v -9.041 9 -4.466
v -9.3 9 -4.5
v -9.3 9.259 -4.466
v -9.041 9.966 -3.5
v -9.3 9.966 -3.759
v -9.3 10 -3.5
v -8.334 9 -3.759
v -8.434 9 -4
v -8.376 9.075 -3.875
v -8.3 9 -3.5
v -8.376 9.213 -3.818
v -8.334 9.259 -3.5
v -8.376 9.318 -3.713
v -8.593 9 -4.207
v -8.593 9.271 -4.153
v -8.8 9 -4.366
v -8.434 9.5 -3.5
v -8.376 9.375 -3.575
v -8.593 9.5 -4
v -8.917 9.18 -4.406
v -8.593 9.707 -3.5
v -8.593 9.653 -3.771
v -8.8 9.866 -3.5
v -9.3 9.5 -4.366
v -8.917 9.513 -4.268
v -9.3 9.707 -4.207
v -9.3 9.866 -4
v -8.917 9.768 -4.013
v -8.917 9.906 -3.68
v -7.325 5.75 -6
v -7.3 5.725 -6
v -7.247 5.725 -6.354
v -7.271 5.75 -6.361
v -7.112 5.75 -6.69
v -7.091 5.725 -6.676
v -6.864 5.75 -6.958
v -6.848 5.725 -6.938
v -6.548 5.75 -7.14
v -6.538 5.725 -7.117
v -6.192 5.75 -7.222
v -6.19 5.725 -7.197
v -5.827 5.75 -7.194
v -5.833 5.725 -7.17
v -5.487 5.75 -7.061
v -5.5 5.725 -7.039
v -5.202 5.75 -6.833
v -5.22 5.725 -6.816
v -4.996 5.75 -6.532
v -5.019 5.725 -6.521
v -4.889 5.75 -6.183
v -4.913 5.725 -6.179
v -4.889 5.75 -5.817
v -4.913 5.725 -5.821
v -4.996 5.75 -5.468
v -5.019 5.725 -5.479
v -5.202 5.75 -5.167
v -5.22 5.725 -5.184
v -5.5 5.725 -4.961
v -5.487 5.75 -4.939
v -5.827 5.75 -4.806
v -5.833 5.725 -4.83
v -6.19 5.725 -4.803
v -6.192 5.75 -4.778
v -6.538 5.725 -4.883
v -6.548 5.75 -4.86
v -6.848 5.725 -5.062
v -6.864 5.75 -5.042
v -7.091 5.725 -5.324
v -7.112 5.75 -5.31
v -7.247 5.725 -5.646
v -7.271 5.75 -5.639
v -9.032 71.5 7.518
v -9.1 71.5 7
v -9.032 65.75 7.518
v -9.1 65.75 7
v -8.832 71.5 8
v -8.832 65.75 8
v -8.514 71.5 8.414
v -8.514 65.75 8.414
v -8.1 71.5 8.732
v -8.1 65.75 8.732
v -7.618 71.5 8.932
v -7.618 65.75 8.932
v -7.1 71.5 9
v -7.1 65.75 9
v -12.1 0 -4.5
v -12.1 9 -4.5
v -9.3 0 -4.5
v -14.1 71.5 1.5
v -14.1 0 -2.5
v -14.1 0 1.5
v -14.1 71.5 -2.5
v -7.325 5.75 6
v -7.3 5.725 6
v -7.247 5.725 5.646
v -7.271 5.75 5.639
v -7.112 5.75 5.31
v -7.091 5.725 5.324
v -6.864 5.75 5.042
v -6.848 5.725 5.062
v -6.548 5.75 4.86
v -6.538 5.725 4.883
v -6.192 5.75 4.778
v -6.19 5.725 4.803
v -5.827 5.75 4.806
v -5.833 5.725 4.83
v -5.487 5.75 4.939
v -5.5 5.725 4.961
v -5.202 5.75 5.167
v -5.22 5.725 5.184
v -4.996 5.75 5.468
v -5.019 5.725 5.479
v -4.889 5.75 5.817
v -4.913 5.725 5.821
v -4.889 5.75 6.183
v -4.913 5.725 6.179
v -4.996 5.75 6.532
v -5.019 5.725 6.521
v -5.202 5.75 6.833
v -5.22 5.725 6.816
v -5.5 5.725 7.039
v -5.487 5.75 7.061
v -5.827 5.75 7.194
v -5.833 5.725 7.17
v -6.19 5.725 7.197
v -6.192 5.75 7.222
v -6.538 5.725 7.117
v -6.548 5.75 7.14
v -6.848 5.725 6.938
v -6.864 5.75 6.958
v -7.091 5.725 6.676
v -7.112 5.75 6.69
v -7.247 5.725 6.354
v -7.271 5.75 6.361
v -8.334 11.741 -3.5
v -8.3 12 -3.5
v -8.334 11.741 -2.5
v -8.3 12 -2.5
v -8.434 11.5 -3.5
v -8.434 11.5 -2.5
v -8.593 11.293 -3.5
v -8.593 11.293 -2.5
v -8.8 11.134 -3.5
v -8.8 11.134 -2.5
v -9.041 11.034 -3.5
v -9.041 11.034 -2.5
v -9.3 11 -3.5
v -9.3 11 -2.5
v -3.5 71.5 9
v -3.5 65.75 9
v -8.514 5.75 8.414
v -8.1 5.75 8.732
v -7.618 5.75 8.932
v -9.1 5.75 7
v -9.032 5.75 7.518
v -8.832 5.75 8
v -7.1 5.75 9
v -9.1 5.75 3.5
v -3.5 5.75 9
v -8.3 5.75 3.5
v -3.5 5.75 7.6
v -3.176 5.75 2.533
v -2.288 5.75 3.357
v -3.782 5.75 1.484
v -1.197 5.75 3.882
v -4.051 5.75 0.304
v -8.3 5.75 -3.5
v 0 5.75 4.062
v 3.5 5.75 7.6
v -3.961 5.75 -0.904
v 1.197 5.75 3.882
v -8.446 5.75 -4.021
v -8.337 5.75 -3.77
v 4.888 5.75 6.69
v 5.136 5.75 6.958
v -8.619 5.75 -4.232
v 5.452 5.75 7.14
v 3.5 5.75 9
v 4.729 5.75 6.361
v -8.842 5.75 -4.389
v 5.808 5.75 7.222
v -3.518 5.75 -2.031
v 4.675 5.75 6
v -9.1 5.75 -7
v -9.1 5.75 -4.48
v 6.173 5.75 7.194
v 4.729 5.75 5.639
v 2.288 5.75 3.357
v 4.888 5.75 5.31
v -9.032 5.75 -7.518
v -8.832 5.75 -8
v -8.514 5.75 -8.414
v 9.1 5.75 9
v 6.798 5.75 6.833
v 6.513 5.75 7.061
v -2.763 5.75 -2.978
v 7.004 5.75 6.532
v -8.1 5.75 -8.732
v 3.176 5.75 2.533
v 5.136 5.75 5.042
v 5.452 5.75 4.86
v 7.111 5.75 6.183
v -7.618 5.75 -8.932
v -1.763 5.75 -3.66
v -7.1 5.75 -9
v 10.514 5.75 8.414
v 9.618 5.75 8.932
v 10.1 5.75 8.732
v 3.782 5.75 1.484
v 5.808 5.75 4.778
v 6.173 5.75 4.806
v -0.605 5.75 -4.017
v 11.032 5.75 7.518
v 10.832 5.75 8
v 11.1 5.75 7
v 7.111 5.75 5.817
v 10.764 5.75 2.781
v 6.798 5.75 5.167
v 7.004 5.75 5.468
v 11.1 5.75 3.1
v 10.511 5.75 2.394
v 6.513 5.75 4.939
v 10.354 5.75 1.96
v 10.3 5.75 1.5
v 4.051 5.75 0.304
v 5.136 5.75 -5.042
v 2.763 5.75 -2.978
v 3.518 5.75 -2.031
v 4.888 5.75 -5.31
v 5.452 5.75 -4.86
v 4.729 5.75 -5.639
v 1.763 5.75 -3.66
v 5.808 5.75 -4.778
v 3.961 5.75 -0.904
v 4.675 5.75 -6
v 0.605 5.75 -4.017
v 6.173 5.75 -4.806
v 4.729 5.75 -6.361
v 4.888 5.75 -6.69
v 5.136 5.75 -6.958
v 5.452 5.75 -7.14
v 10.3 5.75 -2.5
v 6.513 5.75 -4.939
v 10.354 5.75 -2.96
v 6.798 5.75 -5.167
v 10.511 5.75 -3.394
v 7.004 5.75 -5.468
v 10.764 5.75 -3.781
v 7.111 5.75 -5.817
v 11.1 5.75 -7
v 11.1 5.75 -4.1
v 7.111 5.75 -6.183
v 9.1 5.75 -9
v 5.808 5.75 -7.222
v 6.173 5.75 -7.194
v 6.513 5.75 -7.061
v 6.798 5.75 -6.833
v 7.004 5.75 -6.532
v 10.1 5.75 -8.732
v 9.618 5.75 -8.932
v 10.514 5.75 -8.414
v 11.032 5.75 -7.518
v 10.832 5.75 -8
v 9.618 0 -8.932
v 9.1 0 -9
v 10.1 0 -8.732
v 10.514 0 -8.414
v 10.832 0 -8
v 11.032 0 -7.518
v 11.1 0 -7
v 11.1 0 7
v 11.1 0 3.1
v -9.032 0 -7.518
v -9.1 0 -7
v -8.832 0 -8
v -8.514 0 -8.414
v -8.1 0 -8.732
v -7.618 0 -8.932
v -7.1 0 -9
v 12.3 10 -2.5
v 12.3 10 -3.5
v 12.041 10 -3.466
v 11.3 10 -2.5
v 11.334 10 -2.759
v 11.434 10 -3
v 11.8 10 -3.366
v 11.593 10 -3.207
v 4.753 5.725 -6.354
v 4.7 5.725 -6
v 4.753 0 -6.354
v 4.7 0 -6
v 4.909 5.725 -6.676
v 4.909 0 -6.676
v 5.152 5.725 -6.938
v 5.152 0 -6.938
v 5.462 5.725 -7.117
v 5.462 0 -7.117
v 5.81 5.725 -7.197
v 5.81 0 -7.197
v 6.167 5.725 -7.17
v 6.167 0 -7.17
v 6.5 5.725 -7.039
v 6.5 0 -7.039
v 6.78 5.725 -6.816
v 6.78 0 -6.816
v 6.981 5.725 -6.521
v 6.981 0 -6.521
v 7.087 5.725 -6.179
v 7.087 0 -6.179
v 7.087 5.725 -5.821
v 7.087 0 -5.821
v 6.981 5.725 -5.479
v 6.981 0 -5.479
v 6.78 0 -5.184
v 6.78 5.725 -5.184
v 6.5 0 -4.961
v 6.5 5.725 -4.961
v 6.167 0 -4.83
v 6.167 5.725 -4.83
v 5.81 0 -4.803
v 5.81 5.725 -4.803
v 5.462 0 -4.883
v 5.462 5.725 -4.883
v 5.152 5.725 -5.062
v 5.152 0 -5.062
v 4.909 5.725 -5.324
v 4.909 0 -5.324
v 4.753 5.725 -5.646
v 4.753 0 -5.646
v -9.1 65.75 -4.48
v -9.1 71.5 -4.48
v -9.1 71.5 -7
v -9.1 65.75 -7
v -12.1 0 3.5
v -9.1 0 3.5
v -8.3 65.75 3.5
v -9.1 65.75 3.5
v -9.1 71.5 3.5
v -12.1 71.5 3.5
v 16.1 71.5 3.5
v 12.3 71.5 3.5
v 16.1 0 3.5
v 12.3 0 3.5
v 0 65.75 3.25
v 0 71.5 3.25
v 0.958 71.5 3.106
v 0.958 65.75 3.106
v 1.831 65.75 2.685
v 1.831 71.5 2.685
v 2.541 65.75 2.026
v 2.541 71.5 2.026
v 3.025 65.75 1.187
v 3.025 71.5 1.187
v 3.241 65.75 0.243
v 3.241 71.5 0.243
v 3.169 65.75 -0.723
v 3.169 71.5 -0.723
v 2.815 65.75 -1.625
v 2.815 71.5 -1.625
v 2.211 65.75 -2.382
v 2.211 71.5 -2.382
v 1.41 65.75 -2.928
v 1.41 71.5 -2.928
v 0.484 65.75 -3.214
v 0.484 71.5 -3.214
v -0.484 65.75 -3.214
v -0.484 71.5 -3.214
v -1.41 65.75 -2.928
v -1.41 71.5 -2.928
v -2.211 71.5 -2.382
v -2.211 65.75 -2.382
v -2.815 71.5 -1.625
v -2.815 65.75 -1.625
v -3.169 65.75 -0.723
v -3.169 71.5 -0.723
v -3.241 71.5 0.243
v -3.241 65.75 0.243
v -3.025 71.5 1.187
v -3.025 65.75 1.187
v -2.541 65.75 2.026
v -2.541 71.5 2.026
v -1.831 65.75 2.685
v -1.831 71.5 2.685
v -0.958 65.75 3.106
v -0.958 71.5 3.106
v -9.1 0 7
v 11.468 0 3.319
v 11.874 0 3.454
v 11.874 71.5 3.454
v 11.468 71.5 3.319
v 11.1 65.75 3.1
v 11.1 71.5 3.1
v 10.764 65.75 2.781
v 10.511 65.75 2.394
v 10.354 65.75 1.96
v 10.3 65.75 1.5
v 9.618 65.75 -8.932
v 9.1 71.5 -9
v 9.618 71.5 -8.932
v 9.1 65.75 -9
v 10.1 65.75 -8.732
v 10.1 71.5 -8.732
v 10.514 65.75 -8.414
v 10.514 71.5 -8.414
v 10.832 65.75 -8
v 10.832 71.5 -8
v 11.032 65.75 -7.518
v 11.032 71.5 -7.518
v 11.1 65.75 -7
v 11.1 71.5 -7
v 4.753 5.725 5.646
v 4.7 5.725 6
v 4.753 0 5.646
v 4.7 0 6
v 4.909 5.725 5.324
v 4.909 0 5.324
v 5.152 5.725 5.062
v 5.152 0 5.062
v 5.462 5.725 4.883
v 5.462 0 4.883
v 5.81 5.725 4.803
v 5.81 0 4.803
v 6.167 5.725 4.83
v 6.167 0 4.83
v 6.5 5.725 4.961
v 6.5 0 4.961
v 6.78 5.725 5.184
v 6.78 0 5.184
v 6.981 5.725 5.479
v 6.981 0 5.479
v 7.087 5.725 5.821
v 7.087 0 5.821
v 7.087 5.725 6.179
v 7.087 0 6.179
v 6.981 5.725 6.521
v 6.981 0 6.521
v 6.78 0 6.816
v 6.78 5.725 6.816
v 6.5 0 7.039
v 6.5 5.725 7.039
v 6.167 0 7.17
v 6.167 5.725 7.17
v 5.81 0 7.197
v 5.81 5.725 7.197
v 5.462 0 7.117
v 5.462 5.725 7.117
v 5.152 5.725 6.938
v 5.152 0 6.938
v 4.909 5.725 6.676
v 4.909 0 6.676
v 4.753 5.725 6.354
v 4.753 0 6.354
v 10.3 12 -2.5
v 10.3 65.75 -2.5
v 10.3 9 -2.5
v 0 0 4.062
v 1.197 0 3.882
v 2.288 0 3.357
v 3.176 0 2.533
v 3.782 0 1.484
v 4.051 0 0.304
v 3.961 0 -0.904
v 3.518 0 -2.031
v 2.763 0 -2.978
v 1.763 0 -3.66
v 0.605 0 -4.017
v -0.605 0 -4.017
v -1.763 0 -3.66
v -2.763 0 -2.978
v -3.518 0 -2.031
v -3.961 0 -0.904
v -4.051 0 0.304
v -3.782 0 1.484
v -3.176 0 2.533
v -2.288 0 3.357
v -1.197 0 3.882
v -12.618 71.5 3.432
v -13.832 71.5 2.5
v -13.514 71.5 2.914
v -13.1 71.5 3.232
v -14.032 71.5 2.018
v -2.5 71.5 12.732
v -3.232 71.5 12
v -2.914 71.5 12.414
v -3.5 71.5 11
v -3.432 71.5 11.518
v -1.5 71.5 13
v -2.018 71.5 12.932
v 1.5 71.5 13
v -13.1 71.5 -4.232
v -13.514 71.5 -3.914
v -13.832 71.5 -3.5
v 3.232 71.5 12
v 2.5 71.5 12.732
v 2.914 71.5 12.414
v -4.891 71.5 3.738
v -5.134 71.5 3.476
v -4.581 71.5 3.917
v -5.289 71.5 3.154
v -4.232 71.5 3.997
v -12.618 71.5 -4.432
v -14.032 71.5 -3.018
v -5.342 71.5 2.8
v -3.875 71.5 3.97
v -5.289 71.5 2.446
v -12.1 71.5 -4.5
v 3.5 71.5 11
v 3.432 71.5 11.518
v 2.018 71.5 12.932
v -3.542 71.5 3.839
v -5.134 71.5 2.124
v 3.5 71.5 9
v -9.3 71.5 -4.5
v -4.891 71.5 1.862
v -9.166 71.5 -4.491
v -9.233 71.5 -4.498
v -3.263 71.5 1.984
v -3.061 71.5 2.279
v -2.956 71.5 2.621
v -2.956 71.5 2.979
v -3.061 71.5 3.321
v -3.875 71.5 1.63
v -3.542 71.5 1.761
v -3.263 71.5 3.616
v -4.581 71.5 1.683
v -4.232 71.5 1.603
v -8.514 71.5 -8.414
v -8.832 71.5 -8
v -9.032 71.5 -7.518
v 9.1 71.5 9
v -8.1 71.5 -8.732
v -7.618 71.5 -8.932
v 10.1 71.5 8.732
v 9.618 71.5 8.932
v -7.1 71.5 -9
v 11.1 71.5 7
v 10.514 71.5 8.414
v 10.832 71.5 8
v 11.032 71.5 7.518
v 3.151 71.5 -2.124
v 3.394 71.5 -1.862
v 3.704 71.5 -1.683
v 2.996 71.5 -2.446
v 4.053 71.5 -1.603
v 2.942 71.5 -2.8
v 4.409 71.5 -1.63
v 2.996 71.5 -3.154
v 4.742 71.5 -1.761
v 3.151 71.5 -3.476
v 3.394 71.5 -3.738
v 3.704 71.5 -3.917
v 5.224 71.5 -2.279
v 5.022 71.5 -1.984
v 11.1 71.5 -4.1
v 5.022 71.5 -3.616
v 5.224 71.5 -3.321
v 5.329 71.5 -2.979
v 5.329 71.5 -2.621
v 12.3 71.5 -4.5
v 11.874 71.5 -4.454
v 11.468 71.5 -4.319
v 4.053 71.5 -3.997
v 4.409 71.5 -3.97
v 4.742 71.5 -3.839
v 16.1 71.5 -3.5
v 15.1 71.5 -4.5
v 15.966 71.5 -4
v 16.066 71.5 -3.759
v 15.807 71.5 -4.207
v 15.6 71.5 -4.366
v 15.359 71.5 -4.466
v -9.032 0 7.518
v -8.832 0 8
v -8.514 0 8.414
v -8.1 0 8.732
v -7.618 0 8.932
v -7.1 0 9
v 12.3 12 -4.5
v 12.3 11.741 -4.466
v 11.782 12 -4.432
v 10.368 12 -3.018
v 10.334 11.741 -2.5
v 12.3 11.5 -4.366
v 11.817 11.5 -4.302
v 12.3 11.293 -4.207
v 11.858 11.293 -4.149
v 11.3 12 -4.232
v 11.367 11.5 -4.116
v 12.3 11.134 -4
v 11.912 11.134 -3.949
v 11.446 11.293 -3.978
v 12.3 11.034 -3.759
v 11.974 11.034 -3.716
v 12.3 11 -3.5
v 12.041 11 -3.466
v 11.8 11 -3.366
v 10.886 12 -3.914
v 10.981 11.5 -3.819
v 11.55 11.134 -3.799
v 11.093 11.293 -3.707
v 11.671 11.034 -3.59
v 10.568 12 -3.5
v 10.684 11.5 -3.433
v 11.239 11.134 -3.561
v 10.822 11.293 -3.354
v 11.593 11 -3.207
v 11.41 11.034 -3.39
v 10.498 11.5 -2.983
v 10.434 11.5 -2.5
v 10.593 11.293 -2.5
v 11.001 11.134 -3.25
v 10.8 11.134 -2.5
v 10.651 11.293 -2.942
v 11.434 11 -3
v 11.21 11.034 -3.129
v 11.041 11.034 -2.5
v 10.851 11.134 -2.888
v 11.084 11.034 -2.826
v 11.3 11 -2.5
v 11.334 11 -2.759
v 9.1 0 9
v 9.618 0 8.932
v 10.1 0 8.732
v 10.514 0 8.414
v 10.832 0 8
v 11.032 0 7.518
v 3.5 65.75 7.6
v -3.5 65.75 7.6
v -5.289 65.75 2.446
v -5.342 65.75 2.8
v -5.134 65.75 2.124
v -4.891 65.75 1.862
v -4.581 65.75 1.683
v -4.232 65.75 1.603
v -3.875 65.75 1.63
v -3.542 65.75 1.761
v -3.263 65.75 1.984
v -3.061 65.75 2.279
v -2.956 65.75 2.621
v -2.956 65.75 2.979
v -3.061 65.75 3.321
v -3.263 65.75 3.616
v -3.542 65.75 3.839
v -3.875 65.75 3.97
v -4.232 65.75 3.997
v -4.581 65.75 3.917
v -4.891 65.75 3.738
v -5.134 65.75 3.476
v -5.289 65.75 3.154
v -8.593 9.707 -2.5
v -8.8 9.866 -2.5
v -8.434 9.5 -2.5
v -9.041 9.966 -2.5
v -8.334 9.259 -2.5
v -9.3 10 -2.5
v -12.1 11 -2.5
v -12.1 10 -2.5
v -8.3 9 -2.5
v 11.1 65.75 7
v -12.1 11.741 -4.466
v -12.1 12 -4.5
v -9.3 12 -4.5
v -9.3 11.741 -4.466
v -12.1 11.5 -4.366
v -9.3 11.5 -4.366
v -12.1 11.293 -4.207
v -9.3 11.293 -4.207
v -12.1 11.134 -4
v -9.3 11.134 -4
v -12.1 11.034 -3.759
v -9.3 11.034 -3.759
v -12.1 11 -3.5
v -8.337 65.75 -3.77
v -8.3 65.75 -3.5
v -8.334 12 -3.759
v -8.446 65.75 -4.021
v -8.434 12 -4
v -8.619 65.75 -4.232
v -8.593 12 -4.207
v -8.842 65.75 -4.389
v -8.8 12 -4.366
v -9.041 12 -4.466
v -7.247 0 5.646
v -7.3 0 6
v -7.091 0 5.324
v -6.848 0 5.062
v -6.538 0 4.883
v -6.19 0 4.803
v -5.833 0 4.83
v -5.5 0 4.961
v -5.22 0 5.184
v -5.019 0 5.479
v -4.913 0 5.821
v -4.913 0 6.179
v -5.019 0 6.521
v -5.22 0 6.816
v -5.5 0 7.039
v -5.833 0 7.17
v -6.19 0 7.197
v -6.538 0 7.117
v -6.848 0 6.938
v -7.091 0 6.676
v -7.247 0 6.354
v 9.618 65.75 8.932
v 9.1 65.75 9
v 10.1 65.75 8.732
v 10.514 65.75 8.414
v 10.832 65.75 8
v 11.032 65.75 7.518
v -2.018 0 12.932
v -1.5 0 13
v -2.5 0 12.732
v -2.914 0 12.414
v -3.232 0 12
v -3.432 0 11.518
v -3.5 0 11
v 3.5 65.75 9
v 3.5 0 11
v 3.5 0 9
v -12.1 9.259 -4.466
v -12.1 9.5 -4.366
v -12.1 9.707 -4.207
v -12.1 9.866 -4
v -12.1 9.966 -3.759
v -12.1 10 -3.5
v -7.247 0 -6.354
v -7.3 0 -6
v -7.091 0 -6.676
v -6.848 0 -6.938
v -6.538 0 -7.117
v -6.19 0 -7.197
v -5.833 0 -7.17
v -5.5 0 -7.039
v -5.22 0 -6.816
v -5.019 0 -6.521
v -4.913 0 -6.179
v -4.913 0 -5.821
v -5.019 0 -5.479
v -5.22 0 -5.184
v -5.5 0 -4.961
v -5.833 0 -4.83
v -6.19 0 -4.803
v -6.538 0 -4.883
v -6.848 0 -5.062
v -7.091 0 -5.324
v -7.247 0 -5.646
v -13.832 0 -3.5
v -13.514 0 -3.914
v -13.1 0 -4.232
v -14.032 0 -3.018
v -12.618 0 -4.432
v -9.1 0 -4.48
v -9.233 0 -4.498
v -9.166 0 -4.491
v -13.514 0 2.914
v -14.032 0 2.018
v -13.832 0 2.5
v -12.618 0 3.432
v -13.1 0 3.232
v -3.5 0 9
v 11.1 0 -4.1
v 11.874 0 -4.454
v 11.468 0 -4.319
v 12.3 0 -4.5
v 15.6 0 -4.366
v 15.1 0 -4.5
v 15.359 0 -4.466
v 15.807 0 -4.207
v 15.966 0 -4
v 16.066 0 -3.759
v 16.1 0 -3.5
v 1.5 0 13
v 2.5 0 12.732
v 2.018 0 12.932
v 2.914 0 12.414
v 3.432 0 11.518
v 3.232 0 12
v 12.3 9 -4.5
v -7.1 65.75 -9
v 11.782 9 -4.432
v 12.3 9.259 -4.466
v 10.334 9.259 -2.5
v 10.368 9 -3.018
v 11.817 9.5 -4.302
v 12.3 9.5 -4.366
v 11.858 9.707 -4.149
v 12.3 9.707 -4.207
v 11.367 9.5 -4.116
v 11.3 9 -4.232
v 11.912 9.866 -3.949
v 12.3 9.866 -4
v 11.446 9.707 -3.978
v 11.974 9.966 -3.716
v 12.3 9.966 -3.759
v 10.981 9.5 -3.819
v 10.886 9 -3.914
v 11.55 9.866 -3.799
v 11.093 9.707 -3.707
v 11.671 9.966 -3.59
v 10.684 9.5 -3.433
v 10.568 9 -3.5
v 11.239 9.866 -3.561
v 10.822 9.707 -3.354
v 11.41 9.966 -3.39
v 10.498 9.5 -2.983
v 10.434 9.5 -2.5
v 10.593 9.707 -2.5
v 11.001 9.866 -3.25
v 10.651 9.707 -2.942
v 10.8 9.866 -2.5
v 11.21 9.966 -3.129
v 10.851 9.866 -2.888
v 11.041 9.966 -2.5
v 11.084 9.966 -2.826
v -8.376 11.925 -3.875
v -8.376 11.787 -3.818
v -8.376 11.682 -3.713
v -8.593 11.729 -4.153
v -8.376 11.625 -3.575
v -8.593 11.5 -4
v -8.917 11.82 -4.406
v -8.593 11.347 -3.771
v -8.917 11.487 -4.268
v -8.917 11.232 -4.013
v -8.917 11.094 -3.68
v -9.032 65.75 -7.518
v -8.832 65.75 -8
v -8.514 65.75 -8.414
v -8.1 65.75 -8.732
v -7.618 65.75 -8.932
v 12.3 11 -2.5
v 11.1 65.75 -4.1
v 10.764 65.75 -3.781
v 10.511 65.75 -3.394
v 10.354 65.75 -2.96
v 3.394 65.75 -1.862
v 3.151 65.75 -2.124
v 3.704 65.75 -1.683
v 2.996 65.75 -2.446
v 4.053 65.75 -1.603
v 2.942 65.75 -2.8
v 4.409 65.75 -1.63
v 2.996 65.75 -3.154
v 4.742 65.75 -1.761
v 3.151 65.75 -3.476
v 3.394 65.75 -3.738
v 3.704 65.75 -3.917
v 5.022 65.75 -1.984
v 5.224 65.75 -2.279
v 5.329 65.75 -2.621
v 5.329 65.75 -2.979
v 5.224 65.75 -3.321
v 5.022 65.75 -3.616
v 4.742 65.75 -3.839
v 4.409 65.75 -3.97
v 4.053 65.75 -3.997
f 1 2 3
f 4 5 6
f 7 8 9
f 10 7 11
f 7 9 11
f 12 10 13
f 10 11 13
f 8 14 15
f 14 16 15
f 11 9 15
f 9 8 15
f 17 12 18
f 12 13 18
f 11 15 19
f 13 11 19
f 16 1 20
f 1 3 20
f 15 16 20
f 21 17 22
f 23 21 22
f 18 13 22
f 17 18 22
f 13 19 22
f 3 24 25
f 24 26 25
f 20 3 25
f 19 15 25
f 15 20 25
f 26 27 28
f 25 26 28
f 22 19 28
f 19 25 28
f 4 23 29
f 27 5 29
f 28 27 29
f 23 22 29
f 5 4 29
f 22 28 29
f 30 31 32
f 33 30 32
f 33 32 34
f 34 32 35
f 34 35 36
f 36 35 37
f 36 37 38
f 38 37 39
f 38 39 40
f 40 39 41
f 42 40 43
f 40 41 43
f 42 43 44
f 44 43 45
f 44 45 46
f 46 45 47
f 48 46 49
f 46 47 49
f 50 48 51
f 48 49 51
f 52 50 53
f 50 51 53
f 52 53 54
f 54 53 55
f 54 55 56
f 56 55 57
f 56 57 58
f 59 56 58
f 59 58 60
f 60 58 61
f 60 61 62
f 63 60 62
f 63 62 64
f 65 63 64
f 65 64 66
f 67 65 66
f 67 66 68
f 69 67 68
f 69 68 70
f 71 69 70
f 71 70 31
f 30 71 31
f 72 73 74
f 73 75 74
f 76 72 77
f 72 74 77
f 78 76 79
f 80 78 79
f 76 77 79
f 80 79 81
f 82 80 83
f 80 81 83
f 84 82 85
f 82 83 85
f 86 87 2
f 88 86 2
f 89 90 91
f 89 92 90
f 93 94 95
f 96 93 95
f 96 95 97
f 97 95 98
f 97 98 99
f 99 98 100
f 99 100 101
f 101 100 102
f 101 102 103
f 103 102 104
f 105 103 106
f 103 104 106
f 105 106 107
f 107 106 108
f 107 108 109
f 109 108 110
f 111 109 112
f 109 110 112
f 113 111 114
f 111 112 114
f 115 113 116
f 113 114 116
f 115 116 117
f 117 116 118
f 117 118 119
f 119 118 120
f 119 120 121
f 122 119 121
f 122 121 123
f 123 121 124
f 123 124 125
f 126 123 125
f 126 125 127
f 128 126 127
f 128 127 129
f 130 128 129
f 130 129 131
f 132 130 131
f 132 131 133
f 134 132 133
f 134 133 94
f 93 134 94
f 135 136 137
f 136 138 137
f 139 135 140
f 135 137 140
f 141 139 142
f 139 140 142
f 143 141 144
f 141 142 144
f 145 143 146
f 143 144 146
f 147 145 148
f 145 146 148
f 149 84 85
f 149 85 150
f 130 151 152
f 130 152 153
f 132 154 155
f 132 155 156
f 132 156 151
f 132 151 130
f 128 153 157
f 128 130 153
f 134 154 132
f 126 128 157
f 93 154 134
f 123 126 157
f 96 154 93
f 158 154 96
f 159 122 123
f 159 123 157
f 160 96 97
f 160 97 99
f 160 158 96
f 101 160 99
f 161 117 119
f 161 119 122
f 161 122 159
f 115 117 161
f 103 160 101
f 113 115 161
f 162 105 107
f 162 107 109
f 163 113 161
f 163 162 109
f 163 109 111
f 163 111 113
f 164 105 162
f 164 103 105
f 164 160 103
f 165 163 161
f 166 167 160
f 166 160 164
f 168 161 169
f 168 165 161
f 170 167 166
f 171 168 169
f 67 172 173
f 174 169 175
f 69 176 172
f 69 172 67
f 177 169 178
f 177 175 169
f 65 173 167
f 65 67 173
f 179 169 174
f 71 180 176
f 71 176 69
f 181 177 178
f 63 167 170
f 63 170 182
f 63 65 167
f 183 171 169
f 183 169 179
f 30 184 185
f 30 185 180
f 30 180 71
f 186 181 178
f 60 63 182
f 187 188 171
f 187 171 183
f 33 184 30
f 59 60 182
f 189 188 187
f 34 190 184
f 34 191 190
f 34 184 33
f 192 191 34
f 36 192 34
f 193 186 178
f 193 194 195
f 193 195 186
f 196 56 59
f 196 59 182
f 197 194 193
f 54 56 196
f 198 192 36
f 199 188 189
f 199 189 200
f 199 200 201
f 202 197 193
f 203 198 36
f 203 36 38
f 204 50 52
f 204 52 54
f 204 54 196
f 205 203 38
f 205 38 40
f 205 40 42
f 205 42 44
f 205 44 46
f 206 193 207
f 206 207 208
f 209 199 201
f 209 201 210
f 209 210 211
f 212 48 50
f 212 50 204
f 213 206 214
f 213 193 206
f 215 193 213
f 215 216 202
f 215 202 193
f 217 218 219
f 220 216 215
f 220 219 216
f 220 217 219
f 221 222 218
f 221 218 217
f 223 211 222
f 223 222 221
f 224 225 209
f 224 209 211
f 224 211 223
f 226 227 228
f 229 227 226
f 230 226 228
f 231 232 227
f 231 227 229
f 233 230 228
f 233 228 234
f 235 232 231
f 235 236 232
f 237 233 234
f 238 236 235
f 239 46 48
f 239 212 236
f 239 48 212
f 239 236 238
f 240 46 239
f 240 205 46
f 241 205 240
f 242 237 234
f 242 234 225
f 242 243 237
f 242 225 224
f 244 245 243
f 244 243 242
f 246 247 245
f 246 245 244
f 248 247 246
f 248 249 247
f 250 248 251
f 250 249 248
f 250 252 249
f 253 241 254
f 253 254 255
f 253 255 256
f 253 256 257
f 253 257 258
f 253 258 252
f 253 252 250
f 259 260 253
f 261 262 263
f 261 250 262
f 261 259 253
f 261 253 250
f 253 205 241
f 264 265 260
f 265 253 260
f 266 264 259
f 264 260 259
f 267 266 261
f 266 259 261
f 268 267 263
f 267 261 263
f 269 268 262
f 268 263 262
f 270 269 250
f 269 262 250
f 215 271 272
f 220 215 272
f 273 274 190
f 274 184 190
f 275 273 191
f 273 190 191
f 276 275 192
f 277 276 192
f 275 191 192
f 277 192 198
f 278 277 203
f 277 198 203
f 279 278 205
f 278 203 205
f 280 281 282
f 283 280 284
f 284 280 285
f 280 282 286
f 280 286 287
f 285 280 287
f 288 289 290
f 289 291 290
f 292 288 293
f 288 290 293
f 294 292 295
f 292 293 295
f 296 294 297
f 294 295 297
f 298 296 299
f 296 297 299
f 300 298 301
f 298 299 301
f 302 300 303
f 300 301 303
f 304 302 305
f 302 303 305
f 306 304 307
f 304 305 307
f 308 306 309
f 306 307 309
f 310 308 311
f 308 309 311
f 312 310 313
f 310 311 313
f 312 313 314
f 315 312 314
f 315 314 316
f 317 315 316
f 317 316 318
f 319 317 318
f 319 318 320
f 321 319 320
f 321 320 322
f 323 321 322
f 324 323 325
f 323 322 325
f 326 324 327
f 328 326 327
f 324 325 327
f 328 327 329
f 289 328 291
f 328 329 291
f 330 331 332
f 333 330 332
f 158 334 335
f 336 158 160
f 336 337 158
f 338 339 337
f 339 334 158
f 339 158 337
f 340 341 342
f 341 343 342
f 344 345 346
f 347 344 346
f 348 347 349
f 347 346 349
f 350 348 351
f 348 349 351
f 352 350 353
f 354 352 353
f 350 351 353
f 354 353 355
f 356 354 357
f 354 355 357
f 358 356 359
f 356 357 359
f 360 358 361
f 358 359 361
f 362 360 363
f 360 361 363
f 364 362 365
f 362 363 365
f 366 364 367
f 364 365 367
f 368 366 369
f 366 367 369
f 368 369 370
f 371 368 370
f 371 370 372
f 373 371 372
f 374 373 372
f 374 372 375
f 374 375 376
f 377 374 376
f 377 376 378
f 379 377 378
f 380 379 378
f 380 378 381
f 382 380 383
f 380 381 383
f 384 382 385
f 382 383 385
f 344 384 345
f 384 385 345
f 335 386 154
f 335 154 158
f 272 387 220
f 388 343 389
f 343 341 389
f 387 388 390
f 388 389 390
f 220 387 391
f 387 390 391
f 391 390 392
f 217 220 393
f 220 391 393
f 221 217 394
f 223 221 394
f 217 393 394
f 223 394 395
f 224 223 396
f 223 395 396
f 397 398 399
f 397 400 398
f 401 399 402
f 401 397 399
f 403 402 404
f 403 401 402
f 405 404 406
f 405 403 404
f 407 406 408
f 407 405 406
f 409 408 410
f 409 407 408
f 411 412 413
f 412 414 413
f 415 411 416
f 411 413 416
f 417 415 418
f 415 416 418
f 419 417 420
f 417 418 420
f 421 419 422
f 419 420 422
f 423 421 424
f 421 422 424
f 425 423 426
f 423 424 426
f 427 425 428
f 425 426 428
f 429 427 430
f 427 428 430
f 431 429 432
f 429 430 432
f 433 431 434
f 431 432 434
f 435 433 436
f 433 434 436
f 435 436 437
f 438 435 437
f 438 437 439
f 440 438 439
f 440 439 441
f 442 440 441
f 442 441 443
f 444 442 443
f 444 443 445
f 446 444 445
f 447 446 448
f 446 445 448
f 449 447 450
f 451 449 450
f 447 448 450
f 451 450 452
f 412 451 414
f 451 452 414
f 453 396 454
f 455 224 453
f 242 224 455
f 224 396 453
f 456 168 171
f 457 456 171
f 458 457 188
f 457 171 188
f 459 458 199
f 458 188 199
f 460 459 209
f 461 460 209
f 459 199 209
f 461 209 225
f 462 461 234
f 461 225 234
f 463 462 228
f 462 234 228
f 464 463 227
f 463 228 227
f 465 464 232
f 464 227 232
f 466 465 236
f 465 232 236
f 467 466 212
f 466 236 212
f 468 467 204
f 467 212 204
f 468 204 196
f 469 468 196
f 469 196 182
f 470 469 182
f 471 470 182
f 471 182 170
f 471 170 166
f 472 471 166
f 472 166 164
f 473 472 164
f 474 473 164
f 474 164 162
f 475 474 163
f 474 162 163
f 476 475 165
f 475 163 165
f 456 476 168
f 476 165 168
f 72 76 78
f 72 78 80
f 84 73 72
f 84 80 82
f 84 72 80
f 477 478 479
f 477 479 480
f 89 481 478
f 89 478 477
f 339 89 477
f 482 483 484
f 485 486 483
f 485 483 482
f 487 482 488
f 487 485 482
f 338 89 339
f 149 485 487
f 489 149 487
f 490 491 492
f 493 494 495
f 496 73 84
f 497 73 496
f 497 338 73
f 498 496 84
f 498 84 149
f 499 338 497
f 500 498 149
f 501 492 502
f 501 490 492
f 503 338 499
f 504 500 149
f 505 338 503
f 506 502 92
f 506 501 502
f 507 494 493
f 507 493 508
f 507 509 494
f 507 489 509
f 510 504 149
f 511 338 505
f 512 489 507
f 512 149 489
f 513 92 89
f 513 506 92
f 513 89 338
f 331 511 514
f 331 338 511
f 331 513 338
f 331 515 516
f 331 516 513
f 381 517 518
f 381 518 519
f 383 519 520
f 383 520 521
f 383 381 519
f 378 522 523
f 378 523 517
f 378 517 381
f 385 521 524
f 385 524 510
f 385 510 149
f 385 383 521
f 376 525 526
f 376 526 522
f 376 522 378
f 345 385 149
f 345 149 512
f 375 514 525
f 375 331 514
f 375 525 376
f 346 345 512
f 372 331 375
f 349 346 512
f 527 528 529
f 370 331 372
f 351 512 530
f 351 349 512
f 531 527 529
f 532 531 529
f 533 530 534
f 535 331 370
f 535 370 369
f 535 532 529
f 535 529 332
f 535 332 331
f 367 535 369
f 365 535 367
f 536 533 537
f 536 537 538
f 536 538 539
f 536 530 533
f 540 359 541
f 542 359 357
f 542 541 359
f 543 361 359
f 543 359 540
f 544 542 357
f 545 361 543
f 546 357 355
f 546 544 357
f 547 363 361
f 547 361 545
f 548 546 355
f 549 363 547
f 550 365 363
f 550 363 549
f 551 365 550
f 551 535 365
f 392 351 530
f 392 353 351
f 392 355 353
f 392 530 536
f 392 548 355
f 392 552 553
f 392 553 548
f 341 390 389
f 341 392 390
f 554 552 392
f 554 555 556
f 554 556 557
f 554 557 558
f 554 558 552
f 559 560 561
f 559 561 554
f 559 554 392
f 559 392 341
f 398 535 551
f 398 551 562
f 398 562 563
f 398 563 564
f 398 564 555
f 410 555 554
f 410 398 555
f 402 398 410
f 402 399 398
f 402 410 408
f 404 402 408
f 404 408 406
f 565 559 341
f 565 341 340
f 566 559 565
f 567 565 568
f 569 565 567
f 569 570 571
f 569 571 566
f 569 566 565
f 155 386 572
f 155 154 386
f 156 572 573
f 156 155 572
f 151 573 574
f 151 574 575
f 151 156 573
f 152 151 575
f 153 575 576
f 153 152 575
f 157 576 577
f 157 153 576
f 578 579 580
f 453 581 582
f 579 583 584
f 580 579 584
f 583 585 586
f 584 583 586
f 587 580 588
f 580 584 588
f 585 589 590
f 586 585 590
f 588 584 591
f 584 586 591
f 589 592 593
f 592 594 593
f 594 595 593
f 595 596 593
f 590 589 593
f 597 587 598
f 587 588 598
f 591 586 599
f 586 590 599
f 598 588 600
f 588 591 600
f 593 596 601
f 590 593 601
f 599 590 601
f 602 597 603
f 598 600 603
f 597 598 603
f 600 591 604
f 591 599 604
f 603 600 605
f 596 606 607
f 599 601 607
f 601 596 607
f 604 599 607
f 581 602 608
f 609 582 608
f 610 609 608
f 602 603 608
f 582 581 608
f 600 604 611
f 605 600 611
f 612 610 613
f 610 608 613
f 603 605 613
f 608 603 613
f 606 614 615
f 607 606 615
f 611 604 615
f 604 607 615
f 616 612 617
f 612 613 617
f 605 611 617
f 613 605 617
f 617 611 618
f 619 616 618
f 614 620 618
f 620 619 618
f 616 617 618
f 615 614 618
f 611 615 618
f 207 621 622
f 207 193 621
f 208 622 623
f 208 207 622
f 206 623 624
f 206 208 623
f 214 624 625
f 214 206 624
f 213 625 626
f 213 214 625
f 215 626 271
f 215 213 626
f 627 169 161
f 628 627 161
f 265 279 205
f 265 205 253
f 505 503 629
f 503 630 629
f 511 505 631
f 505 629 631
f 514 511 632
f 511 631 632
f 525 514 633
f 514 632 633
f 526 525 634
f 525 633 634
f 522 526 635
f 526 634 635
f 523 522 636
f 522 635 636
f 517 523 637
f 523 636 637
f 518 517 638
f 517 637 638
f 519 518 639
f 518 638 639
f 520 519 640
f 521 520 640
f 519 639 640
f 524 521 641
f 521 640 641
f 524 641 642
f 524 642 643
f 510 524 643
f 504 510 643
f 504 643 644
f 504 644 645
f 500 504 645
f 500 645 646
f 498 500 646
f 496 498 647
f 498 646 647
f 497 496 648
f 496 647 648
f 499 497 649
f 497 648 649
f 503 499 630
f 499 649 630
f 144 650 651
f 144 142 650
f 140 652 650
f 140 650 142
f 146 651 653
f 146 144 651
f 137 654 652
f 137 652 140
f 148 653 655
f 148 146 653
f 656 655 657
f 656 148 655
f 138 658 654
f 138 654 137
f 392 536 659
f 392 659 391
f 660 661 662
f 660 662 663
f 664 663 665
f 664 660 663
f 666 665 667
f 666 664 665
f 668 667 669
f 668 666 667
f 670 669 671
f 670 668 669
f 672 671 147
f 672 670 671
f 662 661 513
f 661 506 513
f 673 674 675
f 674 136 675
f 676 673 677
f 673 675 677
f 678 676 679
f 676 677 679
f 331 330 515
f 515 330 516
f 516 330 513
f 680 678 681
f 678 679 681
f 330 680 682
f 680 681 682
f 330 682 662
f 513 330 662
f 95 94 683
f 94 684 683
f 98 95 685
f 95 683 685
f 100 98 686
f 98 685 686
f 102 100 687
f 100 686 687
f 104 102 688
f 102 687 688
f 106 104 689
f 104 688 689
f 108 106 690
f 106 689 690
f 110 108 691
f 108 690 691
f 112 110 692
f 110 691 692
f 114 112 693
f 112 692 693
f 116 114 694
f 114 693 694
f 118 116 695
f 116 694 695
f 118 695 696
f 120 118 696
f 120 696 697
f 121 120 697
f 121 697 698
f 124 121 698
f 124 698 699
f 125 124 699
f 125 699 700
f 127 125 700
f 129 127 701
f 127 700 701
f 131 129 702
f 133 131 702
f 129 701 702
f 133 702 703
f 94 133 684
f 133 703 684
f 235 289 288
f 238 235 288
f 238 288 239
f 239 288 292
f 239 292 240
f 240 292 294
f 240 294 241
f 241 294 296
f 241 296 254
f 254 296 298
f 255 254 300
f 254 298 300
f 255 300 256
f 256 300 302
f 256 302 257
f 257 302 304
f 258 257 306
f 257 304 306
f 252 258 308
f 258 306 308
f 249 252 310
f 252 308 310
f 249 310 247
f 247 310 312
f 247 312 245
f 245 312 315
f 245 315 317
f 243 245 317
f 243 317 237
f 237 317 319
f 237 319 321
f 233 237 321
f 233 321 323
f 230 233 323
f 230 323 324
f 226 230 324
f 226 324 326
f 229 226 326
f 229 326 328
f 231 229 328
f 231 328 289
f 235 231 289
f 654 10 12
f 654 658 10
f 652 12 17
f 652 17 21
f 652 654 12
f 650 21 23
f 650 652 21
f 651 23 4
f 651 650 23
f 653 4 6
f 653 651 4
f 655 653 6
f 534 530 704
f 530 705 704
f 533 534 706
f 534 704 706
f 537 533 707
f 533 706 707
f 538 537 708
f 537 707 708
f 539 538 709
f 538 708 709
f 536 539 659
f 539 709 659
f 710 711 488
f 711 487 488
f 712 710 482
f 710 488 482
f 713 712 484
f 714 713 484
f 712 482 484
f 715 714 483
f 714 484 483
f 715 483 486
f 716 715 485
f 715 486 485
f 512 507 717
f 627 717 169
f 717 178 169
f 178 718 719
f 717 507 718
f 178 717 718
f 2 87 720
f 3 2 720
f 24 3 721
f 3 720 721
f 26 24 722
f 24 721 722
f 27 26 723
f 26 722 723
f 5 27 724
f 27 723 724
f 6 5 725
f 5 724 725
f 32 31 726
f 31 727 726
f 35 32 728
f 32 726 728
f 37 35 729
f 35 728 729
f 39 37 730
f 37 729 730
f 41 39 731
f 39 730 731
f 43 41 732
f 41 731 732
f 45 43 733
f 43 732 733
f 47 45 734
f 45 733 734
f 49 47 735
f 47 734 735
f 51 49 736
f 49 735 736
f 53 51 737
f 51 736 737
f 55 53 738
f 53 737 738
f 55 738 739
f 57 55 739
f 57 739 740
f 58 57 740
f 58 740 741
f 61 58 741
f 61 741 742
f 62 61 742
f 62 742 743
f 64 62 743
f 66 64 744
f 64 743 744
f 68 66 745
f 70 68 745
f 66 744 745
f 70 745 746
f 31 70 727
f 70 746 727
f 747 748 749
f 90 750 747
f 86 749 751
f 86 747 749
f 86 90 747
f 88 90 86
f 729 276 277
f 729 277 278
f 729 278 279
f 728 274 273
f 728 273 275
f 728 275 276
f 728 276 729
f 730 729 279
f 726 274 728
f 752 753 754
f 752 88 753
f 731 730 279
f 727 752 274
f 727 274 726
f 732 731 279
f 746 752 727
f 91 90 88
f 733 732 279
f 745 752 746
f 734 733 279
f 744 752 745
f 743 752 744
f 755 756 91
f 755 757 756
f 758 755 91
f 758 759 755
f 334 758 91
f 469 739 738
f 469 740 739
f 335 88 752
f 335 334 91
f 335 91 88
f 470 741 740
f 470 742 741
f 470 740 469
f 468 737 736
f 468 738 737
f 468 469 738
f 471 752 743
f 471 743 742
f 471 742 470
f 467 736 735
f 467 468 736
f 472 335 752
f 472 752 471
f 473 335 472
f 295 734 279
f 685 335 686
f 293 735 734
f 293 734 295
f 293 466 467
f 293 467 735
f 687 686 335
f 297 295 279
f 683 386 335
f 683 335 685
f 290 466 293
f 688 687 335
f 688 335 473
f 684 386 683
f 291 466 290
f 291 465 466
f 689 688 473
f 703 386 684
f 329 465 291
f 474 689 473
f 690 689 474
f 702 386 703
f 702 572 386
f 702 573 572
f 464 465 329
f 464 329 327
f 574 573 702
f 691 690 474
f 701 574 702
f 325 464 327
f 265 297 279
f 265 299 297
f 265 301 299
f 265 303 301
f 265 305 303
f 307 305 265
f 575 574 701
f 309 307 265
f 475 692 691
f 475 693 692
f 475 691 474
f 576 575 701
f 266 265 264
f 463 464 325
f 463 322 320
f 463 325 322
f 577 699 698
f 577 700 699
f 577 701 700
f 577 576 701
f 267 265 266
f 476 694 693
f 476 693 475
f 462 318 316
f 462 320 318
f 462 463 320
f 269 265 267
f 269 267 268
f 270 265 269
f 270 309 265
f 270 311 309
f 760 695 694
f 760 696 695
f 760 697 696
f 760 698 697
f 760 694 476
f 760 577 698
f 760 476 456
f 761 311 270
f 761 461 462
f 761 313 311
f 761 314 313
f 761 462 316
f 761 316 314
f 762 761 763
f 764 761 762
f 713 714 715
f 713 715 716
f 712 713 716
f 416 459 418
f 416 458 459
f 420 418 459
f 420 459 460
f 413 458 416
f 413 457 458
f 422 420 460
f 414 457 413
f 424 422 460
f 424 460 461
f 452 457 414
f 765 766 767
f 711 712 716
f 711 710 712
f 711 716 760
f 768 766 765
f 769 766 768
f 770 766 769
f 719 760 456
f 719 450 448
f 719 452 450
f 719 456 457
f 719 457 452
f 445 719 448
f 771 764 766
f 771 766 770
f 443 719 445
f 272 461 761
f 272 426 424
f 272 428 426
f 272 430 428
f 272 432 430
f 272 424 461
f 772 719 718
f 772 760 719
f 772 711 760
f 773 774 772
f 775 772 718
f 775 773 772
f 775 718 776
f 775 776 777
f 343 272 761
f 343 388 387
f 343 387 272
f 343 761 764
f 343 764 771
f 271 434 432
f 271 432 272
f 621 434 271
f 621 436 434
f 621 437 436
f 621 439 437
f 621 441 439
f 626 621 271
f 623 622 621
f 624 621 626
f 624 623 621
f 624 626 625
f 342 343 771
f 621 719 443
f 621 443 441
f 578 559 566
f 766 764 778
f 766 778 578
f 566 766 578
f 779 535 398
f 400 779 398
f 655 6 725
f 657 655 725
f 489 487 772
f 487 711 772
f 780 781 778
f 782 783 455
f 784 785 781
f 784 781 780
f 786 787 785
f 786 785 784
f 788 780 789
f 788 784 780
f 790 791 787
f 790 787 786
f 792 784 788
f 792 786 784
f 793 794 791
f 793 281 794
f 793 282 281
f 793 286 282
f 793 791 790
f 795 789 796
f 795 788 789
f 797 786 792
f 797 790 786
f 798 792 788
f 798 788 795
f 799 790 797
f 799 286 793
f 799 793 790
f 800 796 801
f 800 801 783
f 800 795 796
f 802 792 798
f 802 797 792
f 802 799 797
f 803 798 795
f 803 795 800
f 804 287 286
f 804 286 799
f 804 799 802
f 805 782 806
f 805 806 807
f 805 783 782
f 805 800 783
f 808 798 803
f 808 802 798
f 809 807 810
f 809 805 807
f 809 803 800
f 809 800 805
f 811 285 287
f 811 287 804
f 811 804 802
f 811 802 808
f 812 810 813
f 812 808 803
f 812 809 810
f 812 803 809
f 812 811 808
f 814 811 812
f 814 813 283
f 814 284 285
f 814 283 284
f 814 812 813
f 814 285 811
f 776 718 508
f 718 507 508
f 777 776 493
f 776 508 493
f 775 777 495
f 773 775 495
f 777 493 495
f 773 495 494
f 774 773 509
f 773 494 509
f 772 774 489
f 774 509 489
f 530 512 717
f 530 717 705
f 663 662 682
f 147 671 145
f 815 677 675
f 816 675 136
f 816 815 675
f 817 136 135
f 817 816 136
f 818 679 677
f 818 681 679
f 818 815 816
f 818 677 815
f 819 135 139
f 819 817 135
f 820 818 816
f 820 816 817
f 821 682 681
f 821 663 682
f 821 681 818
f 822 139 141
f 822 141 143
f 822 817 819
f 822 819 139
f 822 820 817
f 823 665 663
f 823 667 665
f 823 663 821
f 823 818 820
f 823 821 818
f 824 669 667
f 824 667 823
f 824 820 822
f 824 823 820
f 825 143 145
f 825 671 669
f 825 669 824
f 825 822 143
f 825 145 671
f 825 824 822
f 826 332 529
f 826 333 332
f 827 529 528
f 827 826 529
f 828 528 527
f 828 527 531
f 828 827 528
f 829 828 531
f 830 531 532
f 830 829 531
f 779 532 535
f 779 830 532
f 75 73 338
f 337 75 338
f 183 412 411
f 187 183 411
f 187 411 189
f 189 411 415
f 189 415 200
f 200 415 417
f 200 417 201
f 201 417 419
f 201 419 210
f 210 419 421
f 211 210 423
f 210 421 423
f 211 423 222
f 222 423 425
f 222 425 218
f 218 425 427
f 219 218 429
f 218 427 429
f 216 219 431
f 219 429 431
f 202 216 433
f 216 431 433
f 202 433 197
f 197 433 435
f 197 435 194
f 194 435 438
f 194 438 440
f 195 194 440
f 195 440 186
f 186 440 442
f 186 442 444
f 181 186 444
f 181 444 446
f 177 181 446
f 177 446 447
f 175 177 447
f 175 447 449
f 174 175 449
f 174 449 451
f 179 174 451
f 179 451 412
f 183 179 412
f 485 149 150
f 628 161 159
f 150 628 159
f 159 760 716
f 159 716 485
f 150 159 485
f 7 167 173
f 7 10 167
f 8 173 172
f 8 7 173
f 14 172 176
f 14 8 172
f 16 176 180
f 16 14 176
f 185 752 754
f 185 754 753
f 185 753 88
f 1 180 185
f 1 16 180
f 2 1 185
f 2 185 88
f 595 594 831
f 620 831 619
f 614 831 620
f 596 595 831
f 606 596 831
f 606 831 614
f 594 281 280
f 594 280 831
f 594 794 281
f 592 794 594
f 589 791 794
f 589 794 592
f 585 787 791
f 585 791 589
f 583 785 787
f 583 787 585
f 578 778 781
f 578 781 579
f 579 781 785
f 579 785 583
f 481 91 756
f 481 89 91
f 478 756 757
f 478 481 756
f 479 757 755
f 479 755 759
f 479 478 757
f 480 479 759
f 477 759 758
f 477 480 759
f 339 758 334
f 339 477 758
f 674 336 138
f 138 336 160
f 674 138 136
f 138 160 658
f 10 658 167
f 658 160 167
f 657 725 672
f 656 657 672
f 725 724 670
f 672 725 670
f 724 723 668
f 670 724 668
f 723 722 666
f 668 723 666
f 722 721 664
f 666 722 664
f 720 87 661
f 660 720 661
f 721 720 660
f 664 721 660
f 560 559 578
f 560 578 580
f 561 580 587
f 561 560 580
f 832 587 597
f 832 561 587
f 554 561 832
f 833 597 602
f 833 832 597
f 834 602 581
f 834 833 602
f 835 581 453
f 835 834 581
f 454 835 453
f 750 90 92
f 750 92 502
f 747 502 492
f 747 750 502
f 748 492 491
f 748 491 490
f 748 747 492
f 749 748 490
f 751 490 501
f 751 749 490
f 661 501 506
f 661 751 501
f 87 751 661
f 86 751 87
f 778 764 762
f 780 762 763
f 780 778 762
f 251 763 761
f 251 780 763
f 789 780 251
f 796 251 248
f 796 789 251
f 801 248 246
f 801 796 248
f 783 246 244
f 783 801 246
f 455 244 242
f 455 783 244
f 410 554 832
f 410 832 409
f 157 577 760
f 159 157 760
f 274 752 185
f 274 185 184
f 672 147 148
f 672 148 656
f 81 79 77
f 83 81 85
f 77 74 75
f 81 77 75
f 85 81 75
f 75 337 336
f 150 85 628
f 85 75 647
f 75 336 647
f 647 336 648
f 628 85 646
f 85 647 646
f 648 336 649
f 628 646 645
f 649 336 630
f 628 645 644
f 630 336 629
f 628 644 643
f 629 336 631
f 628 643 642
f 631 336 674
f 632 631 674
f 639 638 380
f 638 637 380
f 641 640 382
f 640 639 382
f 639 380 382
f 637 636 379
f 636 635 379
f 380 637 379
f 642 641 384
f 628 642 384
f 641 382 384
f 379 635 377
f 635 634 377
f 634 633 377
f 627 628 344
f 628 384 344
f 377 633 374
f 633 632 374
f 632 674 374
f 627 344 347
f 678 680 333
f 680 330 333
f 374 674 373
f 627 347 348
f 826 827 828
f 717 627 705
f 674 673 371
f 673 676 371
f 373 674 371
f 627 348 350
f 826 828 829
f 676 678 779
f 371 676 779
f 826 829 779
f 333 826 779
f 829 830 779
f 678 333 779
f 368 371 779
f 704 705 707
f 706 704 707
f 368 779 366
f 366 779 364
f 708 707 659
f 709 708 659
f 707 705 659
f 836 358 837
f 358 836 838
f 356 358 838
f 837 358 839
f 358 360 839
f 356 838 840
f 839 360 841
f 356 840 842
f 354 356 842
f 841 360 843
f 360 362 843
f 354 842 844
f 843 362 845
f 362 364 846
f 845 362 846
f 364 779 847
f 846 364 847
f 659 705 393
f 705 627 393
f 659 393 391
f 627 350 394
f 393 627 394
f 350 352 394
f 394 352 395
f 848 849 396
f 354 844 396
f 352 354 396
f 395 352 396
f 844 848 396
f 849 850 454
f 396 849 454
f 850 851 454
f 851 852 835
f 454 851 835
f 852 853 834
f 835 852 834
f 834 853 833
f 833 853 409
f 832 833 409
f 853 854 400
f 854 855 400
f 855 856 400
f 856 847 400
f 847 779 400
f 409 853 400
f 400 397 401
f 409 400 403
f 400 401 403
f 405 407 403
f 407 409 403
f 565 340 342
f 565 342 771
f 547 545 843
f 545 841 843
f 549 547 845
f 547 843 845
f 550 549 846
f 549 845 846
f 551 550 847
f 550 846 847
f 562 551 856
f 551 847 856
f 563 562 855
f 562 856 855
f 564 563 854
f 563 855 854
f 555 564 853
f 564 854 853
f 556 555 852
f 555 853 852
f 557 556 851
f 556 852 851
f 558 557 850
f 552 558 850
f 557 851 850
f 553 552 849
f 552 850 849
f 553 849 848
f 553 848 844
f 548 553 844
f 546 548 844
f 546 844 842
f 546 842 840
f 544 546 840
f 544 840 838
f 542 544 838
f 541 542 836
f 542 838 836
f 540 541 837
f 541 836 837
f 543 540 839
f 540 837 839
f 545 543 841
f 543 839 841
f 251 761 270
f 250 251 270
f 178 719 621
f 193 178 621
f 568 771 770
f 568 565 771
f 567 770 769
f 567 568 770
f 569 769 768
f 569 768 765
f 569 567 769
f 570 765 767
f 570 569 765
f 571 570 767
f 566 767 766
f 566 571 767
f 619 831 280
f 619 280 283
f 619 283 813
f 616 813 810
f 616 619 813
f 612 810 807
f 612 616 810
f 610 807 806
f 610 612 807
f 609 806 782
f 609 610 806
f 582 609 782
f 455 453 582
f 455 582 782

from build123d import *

# Parameters (mm, degrees)
SKETCH1_W                      = 20.2
SKETCH1_H                      = 18
BOSS_EXTRUDE1_DEPTH            = 5.75
M2_CLEARANCE_HOLE1_D           = 2.4
M2_CLEARANCE_HOLE1_CSINK_D     = 2.45
M2_CLEARANCE_HOLE1_CSINK_ANGLE = 90
SKETCH5_W                      = 5.8
SKETCH5_H                      = 8
BOSS_EXTRUDE2_DEPTH            = 60
SKETCH6_R                      = 4.0625
CUT_EXTRUDE1_DEPTH             = 5.75
SKETCH7_R                      = 3.25
CUT_EXTRUDE2_DEPTH             = 5.75
FILLET1_R                      = 2
M2_CLEARANCE_HOLE2_D           = 2.4
M2_CLEARANCE_HOLE2_DEPTH       = 5.75
M2_CLEARANCE_HOLE2_TIP         = 0.721032743
SKETCH11_W                     = 5
SKETCH11_H                     = 8
SKETCH11_W_2                   = 7
SKETCH11_H_2                   = 4
BOSS_EXTRUDE3_DEPTH            = 5.75
SKETCH12_W                     = 5
SKETCH12_H                     = 8
SKETCH12_W_2                   = 7
SKETCH12_H_2                   = 4
BOSS_EXTRUDE4_DEPTH            = 5.75
FILLET2_R                      = 2
SKETCH14_W                     = 24.4
SKETCH14_H                     = 1
CUT_EXTRUDE3_DEPTH             = 2
FILLET3_R                      = 1
FILLET4_R                      = 1


with BuildPart() as part:
    # Sketch1 → Boss-Extrude1 (new body)
    with BuildSketch(Plane(origin=(0, 0, 0), x_dir=(1, 0, 0), z_dir=(0, 1, 0))):
        with Locations((1, 0)):
            Rectangle(SKETCH1_W, SKETCH1_H)
    boss_extrude1 = extrude(amount=BOSS_EXTRUDE1_DEPTH)

    # M2 Clearance Hole1 (through all)
    with Locations(Plane(origin=(0, 5.75, 0), x_dir=(1, 0, 0), z_dir=(0, 1, 0))):
        with Locations((-6.1, 6), (5.9, 6), (-6.1, -6), (5.9, -6)):
            CounterSinkHole(M2_CLEARANCE_HOLE1_D / 2, M2_CLEARANCE_HOLE1_CSINK_D / 2, counter_sink_angle=M2_CLEARANCE_HOLE1_CSINK_ANGLE)

    # Sketch5 → Boss-Extrude2 (add)
    with BuildSketch(Plane(origin=(0, 5.75, 0), x_dir=(1, 0, 0), z_dir=(0, 1, 0))):
        with Locations((-11.2, 0.5)):
            Rectangle(SKETCH5_W, SKETCH5_H)
        Polygon((3.5, -7.6), (-1.5, -7.6), (-3.5, -7.6), (-3.5, -9), (-3.5, -13), (3.5, -13), (3.5, -9), align=None)
        with Locations((13.2, 0.5)):
            Rectangle(SKETCH5_W, SKETCH5_H)
    extrude(amount=BOSS_EXTRUDE2_DEPTH)

    # Sketch6 → Cut-Extrude1 (cut)
    with BuildSketch(Plane(origin=(0, 5.75, 0), x_dir=(1, 0, 0), z_dir=(0, 1, 0))):
        with Locations(Location((0, 0, 0), (0, 0, 270))):
            Circle(SKETCH6_R)
    extrude(amount=-CUT_EXTRUDE1_DEPTH, mode=Mode.SUBTRACT)

    # Mirror1: Boss-Extrude1 across plane
    add(boss_extrude1.mirror(Plane.ZX.offset(35.75)))

    # Sketch7 → Cut-Extrude2 (cut)
    with BuildSketch(Plane(origin=(0, 71.5, 0), x_dir=(1, 0, 0), z_dir=(0, 1, 0))):
        with Locations(Location((0, 0, 0), (0, 0, 270))):
            Circle(SKETCH7_R)
    extrude(amount=-CUT_EXTRUDE2_DEPTH, mode=Mode.SUBTRACT)

    # Fillet1
    fillet1_edges = [part.edges().sort_by_distance(p)[0] for p in [
        (11.1, 68.625, -9),
        (11.1, 68.625, 9),
        (-9.1, 68.625, 9),
        (-9.1, 68.625, -9),
        (11.1, 2.875, 9),
        (-9.1, 2.875, 9),
        (-9.1, 2.875, -9),
        (11.1, 2.875, -9),
    ]]
    fillet(fillet1_edges, radius=FILLET1_R)

    # M2 Clearance Hole2
    with Locations(Plane(origin=(0, 71.5, 0), x_dir=(1, 0, 0), z_dir=(0, 1, 0))):
        with Locations((-4.142372511, -2.800133921), (4.142372511, 2.800133921)):
            Hole(M2_CLEARANCE_HOLE2_D / 2, depth=M2_CLEARANCE_HOLE2_DEPTH)
            with Locations((0, 0, -(M2_CLEARANCE_HOLE2_DEPTH + M2_CLEARANCE_HOLE2_TIP / 2))):  # 118° drill point
                Cone(0, M2_CLEARANCE_HOLE2_D / 2, M2_CLEARANCE_HOLE2_TIP, mode=Mode.SUBTRACT)

    # Sketch11 → Boss-Extrude3 (add)
    with BuildSketch(Plane(origin=(0, 65.75, 0), x_dir=(1, 0, 0), z_dir=(0, 1, 0))):
        with Locations((-11.6, 0.5)):
            Rectangle(SKETCH11_W, SKETCH11_H)
        with Locations((13.6, 0.5)):
            Rectangle(SKETCH11_W, SKETCH11_H)
        with Locations((0, -11)):
            Rectangle(SKETCH11_W_2, SKETCH11_H_2)
    extrude(amount=BOSS_EXTRUDE3_DEPTH)

    # Sketch12 → Boss-Extrude4 (add)
    with BuildSketch(Plane.XZ.offset(-5.75)):
        with Locations((-11.6, -0.5)):
            Rectangle(SKETCH12_W, SKETCH12_H)
        with Locations((0, 11)):
            Rectangle(SKETCH12_W_2, SKETCH12_H_2)
        with Locations((13.6, -0.5)):
            Rectangle(SKETCH12_W, SKETCH12_H)
    extrude(amount=BOSS_EXTRUDE4_DEPTH)

    # Fillet2
    fillet2_edges = [part.edges().sort_by_distance(p)[0] for p in [
        (-14.1, 35.75, -4.5),
        (-14.1, 35.75, 3.5),
        (3.5, 35.75, 13),
        (-3.5, 35.75, 13),
        (10.3, 35.75, 3.5),
        (10.3, 35.75, -4.5),
    ]]
    fillet(fillet2_edges, radius=FILLET2_R)

    # Sketch14 → Cut-Extrude3 (cut)
    with BuildSketch(Plane(origin=(0, 0, -4.5), x_dir=(-1, 0, 0), z_dir=(0, 0, -1))):
        with Locations((-0.1, 10.5)):
            Rectangle(SKETCH14_W, SKETCH14_H)
    extrude(amount=-CUT_EXTRUDE3_DEPTH, mode=Mode.SUBTRACT)

    # Fillet3
    fillet3_edges = [part.edges().sort_by_distance(p)[0] for p in [
        (10.885786438, 10, -3.914213562),
        (10.885786438, 11, -3.914213562),
        (-10.2, 10, -4.5),
        (-10.2, 11, -4.5),
    ]]
    fillet(fillet3_edges, radius=FILLET3_R)

    # Fillet4
    fillet4_edges = [part.edges().sort_by_distance(p)[0] for p in [
        (-8.3, 11, -3),
        (-8.3, 11.292893219, -4.207106781),
        (-8.3, 10, -3),
        (-8.3, 9.707106781, -4.207106781),
        (16.1, 35.75, -4.5),
        (-8.3, 38.875, -4.5),
        (-8.3, 7.375, -4.5),
    ]]
    fillet(fillet4_edges, radius=FILLET4_R)


solid = part.part
